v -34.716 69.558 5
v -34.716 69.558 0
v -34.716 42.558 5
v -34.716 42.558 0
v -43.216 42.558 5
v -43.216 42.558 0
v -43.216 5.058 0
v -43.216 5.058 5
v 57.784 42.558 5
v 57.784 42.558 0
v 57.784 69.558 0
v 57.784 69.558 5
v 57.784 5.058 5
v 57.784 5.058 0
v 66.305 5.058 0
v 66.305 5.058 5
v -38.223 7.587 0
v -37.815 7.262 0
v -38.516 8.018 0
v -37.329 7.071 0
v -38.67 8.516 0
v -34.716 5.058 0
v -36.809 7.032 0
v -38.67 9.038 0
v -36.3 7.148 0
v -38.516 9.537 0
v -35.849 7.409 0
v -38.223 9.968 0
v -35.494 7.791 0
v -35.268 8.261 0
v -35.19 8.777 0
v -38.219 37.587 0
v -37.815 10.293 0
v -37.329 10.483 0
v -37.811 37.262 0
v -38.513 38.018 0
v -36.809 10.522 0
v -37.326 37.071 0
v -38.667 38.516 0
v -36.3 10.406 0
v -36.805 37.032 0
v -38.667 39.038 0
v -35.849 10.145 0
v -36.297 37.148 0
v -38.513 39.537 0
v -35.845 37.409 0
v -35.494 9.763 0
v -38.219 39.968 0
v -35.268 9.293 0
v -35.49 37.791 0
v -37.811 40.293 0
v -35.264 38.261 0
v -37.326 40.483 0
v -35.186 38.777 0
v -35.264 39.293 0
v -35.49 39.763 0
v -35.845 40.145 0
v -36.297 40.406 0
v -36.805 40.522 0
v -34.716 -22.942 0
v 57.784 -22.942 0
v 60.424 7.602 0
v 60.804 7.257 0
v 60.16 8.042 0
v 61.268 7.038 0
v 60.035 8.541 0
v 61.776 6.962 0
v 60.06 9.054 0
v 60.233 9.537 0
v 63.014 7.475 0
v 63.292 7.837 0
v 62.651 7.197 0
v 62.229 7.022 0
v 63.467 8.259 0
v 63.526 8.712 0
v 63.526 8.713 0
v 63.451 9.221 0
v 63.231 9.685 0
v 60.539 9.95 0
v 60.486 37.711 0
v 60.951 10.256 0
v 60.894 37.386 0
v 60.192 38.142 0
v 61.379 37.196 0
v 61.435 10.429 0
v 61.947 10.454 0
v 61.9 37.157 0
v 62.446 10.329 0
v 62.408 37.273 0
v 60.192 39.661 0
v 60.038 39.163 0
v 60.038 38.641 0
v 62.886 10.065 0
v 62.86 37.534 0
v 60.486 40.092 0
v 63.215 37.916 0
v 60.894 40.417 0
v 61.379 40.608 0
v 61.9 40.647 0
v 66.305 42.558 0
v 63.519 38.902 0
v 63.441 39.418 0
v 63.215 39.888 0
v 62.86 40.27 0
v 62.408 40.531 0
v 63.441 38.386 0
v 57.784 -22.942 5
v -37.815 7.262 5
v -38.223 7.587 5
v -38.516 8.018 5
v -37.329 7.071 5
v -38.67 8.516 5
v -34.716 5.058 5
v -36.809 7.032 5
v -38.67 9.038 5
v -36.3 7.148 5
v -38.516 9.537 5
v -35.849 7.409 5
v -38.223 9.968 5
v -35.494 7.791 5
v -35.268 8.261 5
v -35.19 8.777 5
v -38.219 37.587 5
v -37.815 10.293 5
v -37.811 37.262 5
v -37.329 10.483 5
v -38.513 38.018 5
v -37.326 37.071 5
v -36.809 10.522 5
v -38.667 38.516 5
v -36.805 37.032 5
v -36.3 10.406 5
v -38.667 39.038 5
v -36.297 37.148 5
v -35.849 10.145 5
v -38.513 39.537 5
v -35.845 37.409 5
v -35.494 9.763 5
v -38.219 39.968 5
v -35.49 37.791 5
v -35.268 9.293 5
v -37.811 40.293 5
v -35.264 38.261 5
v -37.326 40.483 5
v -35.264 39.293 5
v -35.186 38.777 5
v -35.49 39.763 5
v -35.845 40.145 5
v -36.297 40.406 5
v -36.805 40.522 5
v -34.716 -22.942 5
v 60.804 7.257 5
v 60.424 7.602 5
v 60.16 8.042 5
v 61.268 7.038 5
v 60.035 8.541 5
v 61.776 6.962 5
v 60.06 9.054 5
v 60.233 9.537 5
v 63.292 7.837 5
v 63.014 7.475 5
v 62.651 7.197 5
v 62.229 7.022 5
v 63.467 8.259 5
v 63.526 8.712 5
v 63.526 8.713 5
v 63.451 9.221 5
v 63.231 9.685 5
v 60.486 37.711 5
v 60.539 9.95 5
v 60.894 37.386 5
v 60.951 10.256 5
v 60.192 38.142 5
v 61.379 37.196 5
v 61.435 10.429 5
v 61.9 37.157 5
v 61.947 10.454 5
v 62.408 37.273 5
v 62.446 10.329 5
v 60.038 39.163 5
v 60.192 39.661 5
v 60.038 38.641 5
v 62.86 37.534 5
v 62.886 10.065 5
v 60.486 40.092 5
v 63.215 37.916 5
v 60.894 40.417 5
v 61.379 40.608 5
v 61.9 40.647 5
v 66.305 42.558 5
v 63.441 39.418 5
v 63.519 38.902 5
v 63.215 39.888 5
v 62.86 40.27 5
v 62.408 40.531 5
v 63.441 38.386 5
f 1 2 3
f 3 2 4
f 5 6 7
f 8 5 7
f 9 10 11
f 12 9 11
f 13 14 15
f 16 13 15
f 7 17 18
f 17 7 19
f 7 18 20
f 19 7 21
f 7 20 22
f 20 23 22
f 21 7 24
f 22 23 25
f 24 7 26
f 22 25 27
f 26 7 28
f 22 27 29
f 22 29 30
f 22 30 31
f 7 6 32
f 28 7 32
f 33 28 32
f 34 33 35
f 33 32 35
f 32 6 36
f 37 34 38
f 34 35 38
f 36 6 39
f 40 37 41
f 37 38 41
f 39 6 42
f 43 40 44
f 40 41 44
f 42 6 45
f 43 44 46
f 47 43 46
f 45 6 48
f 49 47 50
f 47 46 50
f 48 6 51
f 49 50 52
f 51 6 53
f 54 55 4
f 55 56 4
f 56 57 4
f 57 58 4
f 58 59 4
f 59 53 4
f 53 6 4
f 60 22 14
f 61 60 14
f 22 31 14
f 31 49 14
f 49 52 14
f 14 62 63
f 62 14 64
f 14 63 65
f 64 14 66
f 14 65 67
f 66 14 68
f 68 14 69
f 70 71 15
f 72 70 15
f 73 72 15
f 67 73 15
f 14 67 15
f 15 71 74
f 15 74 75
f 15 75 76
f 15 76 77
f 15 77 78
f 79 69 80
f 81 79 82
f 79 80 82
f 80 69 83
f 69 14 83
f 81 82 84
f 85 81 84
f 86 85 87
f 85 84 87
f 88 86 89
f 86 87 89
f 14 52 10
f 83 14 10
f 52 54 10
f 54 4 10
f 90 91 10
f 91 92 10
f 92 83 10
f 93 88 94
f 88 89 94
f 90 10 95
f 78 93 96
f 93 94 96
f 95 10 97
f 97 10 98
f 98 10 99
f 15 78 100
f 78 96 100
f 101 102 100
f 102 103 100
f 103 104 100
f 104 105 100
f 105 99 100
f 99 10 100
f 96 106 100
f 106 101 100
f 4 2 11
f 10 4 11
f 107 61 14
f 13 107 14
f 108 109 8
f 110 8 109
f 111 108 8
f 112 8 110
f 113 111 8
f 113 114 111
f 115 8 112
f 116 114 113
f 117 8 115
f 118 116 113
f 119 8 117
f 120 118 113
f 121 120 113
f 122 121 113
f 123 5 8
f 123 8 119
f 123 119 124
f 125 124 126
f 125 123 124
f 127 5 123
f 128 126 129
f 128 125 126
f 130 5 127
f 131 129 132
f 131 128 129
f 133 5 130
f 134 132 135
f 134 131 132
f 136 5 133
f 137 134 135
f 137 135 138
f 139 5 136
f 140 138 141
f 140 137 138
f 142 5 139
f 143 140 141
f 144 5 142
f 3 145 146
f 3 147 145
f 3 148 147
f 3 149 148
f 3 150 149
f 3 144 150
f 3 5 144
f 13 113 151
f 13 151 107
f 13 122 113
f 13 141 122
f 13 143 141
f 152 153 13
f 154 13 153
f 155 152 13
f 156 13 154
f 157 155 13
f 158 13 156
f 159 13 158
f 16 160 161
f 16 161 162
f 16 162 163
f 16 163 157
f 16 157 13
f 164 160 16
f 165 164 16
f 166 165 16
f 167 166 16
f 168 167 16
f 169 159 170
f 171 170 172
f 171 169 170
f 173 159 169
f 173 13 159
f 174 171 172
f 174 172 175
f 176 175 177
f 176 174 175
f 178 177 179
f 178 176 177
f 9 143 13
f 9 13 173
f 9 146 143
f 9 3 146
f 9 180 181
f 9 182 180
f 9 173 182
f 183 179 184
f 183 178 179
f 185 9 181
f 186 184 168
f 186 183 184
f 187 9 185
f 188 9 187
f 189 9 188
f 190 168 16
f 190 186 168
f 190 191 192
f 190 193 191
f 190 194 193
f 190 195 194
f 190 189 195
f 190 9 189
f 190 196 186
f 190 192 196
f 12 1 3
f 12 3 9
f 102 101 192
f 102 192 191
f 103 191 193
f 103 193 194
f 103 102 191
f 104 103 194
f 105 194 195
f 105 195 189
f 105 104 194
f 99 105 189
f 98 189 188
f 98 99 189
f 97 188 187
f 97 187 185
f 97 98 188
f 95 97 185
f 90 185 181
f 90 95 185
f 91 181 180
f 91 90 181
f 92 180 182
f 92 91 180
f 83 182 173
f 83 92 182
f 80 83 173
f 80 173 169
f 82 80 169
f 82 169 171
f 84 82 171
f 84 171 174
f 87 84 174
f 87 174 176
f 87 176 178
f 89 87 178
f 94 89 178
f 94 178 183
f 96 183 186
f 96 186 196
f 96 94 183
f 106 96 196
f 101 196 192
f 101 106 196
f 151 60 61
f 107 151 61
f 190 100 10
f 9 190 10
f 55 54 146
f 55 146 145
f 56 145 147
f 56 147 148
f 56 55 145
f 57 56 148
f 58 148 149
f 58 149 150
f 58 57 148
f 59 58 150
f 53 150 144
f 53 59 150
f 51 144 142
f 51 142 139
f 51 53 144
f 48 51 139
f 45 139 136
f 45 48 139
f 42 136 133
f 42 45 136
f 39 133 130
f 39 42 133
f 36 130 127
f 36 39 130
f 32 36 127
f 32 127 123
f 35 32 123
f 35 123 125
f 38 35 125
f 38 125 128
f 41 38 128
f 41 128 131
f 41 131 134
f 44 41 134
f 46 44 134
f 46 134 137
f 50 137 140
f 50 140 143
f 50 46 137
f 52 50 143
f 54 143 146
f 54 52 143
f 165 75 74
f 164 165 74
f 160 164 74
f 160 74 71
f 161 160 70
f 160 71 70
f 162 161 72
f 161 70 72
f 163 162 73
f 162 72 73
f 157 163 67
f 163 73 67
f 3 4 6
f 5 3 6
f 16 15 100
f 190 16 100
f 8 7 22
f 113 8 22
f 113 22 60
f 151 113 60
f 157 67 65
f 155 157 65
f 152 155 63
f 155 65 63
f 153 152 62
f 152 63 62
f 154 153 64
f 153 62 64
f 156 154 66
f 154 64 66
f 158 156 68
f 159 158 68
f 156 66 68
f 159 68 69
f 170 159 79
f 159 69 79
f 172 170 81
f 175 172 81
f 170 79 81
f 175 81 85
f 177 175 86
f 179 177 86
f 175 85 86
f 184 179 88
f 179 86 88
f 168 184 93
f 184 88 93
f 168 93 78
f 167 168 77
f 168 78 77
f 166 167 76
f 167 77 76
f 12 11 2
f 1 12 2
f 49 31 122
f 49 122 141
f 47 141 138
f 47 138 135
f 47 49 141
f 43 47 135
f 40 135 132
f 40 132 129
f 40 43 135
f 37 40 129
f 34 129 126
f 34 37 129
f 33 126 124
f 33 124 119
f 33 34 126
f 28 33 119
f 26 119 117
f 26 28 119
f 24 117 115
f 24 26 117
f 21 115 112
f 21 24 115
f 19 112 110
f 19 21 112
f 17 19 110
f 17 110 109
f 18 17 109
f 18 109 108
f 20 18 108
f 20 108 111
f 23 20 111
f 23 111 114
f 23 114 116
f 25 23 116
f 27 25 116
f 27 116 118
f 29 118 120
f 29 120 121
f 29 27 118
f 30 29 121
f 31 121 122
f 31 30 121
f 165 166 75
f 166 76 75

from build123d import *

# Parameters (mm, degrees)
F0_R     = 1.75
F1_DEPTH = 5


with BuildPart() as f1:
    # F0 (on Top) → F1 (new body)
    with BuildSketch(Plane.XY):
        with BuildLine():
            Line((57.7837471709, 69.5580622628), (-34.7162528291, 69.5580622628))
            Line((-34.7162528291, 69.5580622628), (-34.7162528291, 42.5580622628))
            Line((-34.7162528291, 42.5580622628), (-43.2162528291, 42.5580622628))
            Line((-43.2162528291, 42.5580622628), (-43.2162528291, 5.0580622628))
            Line((-43.2162528291, 5.0580622628), (-34.7162528291, 5.0580622628))
            Line((-34.7162528291, 5.0580622628), (-34.7162528291, -22.9419377372))
            Line((-34.7162528291, -22.9419377372), (57.7837471709, -22.9419377372))
            Line((57.7837471709, -22.9419377372), (57.7837471709, 5.0580622628))
            Line((57.7837471709, 5.0580622628), (61.776727438, 5.0580622628))
            Line((61.776727438, 5.0580622628), (61.7764500569, 6.9623562581))
            ThreePointArc((61.7764500569, 6.9623562581), (60.5385780505, 9.9496128474), (63.5261951319, 8.712611146))
            Line((63.5261951319, 8.712611146), (66.3054800854, 8.713015979))
            Line((66.3054800854, 8.713015979), (66.3054800854, 42.5580622628))
            Line((66.3054800854, 42.5580622628), (57.7837471709, 42.5580622628))
            Line((57.7837471709, 42.5580622628), (57.7837471709, 69.5580622628))
        make_face()
        with Locations((-36.9397651508, 8.7772880495)):
            Circle(F0_R, mode=Mode.SUBTRACT)
        with Locations((-36.9361157864, 38.7772880495)):
            Circle(F0_R, mode=Mode.SUBTRACT)
        with Locations((61.7687867672, 38.9017461427)):
            Circle(F0_R, mode=Mode.SUBTRACT)
        with BuildLine():
            Line((66.3054800854, 5.0580622628), (66.3054800854, 8.713015979))
            Line((66.3054800854, 8.713015979), (63.5261951319, 8.712611146))
            ThreePointArc((63.5261951319, 8.712611146), (63.5261951458, 8.7124836928), (63.5261951505, 8.7123562396))
            ThreePointArc((63.5261951505, 8.7123562396), (63.0137221373, 7.4750094988), (61.7764500569, 6.9623562581))
            Line((61.7764500569, 6.9623562581), (61.776727438, 5.0580622628))
            Line((61.776727438, 5.0580622628), (66.3054800854, 5.0580622628))
        make_face()
    extrude(amount=F1_DEPTH)


solid = f1.part
